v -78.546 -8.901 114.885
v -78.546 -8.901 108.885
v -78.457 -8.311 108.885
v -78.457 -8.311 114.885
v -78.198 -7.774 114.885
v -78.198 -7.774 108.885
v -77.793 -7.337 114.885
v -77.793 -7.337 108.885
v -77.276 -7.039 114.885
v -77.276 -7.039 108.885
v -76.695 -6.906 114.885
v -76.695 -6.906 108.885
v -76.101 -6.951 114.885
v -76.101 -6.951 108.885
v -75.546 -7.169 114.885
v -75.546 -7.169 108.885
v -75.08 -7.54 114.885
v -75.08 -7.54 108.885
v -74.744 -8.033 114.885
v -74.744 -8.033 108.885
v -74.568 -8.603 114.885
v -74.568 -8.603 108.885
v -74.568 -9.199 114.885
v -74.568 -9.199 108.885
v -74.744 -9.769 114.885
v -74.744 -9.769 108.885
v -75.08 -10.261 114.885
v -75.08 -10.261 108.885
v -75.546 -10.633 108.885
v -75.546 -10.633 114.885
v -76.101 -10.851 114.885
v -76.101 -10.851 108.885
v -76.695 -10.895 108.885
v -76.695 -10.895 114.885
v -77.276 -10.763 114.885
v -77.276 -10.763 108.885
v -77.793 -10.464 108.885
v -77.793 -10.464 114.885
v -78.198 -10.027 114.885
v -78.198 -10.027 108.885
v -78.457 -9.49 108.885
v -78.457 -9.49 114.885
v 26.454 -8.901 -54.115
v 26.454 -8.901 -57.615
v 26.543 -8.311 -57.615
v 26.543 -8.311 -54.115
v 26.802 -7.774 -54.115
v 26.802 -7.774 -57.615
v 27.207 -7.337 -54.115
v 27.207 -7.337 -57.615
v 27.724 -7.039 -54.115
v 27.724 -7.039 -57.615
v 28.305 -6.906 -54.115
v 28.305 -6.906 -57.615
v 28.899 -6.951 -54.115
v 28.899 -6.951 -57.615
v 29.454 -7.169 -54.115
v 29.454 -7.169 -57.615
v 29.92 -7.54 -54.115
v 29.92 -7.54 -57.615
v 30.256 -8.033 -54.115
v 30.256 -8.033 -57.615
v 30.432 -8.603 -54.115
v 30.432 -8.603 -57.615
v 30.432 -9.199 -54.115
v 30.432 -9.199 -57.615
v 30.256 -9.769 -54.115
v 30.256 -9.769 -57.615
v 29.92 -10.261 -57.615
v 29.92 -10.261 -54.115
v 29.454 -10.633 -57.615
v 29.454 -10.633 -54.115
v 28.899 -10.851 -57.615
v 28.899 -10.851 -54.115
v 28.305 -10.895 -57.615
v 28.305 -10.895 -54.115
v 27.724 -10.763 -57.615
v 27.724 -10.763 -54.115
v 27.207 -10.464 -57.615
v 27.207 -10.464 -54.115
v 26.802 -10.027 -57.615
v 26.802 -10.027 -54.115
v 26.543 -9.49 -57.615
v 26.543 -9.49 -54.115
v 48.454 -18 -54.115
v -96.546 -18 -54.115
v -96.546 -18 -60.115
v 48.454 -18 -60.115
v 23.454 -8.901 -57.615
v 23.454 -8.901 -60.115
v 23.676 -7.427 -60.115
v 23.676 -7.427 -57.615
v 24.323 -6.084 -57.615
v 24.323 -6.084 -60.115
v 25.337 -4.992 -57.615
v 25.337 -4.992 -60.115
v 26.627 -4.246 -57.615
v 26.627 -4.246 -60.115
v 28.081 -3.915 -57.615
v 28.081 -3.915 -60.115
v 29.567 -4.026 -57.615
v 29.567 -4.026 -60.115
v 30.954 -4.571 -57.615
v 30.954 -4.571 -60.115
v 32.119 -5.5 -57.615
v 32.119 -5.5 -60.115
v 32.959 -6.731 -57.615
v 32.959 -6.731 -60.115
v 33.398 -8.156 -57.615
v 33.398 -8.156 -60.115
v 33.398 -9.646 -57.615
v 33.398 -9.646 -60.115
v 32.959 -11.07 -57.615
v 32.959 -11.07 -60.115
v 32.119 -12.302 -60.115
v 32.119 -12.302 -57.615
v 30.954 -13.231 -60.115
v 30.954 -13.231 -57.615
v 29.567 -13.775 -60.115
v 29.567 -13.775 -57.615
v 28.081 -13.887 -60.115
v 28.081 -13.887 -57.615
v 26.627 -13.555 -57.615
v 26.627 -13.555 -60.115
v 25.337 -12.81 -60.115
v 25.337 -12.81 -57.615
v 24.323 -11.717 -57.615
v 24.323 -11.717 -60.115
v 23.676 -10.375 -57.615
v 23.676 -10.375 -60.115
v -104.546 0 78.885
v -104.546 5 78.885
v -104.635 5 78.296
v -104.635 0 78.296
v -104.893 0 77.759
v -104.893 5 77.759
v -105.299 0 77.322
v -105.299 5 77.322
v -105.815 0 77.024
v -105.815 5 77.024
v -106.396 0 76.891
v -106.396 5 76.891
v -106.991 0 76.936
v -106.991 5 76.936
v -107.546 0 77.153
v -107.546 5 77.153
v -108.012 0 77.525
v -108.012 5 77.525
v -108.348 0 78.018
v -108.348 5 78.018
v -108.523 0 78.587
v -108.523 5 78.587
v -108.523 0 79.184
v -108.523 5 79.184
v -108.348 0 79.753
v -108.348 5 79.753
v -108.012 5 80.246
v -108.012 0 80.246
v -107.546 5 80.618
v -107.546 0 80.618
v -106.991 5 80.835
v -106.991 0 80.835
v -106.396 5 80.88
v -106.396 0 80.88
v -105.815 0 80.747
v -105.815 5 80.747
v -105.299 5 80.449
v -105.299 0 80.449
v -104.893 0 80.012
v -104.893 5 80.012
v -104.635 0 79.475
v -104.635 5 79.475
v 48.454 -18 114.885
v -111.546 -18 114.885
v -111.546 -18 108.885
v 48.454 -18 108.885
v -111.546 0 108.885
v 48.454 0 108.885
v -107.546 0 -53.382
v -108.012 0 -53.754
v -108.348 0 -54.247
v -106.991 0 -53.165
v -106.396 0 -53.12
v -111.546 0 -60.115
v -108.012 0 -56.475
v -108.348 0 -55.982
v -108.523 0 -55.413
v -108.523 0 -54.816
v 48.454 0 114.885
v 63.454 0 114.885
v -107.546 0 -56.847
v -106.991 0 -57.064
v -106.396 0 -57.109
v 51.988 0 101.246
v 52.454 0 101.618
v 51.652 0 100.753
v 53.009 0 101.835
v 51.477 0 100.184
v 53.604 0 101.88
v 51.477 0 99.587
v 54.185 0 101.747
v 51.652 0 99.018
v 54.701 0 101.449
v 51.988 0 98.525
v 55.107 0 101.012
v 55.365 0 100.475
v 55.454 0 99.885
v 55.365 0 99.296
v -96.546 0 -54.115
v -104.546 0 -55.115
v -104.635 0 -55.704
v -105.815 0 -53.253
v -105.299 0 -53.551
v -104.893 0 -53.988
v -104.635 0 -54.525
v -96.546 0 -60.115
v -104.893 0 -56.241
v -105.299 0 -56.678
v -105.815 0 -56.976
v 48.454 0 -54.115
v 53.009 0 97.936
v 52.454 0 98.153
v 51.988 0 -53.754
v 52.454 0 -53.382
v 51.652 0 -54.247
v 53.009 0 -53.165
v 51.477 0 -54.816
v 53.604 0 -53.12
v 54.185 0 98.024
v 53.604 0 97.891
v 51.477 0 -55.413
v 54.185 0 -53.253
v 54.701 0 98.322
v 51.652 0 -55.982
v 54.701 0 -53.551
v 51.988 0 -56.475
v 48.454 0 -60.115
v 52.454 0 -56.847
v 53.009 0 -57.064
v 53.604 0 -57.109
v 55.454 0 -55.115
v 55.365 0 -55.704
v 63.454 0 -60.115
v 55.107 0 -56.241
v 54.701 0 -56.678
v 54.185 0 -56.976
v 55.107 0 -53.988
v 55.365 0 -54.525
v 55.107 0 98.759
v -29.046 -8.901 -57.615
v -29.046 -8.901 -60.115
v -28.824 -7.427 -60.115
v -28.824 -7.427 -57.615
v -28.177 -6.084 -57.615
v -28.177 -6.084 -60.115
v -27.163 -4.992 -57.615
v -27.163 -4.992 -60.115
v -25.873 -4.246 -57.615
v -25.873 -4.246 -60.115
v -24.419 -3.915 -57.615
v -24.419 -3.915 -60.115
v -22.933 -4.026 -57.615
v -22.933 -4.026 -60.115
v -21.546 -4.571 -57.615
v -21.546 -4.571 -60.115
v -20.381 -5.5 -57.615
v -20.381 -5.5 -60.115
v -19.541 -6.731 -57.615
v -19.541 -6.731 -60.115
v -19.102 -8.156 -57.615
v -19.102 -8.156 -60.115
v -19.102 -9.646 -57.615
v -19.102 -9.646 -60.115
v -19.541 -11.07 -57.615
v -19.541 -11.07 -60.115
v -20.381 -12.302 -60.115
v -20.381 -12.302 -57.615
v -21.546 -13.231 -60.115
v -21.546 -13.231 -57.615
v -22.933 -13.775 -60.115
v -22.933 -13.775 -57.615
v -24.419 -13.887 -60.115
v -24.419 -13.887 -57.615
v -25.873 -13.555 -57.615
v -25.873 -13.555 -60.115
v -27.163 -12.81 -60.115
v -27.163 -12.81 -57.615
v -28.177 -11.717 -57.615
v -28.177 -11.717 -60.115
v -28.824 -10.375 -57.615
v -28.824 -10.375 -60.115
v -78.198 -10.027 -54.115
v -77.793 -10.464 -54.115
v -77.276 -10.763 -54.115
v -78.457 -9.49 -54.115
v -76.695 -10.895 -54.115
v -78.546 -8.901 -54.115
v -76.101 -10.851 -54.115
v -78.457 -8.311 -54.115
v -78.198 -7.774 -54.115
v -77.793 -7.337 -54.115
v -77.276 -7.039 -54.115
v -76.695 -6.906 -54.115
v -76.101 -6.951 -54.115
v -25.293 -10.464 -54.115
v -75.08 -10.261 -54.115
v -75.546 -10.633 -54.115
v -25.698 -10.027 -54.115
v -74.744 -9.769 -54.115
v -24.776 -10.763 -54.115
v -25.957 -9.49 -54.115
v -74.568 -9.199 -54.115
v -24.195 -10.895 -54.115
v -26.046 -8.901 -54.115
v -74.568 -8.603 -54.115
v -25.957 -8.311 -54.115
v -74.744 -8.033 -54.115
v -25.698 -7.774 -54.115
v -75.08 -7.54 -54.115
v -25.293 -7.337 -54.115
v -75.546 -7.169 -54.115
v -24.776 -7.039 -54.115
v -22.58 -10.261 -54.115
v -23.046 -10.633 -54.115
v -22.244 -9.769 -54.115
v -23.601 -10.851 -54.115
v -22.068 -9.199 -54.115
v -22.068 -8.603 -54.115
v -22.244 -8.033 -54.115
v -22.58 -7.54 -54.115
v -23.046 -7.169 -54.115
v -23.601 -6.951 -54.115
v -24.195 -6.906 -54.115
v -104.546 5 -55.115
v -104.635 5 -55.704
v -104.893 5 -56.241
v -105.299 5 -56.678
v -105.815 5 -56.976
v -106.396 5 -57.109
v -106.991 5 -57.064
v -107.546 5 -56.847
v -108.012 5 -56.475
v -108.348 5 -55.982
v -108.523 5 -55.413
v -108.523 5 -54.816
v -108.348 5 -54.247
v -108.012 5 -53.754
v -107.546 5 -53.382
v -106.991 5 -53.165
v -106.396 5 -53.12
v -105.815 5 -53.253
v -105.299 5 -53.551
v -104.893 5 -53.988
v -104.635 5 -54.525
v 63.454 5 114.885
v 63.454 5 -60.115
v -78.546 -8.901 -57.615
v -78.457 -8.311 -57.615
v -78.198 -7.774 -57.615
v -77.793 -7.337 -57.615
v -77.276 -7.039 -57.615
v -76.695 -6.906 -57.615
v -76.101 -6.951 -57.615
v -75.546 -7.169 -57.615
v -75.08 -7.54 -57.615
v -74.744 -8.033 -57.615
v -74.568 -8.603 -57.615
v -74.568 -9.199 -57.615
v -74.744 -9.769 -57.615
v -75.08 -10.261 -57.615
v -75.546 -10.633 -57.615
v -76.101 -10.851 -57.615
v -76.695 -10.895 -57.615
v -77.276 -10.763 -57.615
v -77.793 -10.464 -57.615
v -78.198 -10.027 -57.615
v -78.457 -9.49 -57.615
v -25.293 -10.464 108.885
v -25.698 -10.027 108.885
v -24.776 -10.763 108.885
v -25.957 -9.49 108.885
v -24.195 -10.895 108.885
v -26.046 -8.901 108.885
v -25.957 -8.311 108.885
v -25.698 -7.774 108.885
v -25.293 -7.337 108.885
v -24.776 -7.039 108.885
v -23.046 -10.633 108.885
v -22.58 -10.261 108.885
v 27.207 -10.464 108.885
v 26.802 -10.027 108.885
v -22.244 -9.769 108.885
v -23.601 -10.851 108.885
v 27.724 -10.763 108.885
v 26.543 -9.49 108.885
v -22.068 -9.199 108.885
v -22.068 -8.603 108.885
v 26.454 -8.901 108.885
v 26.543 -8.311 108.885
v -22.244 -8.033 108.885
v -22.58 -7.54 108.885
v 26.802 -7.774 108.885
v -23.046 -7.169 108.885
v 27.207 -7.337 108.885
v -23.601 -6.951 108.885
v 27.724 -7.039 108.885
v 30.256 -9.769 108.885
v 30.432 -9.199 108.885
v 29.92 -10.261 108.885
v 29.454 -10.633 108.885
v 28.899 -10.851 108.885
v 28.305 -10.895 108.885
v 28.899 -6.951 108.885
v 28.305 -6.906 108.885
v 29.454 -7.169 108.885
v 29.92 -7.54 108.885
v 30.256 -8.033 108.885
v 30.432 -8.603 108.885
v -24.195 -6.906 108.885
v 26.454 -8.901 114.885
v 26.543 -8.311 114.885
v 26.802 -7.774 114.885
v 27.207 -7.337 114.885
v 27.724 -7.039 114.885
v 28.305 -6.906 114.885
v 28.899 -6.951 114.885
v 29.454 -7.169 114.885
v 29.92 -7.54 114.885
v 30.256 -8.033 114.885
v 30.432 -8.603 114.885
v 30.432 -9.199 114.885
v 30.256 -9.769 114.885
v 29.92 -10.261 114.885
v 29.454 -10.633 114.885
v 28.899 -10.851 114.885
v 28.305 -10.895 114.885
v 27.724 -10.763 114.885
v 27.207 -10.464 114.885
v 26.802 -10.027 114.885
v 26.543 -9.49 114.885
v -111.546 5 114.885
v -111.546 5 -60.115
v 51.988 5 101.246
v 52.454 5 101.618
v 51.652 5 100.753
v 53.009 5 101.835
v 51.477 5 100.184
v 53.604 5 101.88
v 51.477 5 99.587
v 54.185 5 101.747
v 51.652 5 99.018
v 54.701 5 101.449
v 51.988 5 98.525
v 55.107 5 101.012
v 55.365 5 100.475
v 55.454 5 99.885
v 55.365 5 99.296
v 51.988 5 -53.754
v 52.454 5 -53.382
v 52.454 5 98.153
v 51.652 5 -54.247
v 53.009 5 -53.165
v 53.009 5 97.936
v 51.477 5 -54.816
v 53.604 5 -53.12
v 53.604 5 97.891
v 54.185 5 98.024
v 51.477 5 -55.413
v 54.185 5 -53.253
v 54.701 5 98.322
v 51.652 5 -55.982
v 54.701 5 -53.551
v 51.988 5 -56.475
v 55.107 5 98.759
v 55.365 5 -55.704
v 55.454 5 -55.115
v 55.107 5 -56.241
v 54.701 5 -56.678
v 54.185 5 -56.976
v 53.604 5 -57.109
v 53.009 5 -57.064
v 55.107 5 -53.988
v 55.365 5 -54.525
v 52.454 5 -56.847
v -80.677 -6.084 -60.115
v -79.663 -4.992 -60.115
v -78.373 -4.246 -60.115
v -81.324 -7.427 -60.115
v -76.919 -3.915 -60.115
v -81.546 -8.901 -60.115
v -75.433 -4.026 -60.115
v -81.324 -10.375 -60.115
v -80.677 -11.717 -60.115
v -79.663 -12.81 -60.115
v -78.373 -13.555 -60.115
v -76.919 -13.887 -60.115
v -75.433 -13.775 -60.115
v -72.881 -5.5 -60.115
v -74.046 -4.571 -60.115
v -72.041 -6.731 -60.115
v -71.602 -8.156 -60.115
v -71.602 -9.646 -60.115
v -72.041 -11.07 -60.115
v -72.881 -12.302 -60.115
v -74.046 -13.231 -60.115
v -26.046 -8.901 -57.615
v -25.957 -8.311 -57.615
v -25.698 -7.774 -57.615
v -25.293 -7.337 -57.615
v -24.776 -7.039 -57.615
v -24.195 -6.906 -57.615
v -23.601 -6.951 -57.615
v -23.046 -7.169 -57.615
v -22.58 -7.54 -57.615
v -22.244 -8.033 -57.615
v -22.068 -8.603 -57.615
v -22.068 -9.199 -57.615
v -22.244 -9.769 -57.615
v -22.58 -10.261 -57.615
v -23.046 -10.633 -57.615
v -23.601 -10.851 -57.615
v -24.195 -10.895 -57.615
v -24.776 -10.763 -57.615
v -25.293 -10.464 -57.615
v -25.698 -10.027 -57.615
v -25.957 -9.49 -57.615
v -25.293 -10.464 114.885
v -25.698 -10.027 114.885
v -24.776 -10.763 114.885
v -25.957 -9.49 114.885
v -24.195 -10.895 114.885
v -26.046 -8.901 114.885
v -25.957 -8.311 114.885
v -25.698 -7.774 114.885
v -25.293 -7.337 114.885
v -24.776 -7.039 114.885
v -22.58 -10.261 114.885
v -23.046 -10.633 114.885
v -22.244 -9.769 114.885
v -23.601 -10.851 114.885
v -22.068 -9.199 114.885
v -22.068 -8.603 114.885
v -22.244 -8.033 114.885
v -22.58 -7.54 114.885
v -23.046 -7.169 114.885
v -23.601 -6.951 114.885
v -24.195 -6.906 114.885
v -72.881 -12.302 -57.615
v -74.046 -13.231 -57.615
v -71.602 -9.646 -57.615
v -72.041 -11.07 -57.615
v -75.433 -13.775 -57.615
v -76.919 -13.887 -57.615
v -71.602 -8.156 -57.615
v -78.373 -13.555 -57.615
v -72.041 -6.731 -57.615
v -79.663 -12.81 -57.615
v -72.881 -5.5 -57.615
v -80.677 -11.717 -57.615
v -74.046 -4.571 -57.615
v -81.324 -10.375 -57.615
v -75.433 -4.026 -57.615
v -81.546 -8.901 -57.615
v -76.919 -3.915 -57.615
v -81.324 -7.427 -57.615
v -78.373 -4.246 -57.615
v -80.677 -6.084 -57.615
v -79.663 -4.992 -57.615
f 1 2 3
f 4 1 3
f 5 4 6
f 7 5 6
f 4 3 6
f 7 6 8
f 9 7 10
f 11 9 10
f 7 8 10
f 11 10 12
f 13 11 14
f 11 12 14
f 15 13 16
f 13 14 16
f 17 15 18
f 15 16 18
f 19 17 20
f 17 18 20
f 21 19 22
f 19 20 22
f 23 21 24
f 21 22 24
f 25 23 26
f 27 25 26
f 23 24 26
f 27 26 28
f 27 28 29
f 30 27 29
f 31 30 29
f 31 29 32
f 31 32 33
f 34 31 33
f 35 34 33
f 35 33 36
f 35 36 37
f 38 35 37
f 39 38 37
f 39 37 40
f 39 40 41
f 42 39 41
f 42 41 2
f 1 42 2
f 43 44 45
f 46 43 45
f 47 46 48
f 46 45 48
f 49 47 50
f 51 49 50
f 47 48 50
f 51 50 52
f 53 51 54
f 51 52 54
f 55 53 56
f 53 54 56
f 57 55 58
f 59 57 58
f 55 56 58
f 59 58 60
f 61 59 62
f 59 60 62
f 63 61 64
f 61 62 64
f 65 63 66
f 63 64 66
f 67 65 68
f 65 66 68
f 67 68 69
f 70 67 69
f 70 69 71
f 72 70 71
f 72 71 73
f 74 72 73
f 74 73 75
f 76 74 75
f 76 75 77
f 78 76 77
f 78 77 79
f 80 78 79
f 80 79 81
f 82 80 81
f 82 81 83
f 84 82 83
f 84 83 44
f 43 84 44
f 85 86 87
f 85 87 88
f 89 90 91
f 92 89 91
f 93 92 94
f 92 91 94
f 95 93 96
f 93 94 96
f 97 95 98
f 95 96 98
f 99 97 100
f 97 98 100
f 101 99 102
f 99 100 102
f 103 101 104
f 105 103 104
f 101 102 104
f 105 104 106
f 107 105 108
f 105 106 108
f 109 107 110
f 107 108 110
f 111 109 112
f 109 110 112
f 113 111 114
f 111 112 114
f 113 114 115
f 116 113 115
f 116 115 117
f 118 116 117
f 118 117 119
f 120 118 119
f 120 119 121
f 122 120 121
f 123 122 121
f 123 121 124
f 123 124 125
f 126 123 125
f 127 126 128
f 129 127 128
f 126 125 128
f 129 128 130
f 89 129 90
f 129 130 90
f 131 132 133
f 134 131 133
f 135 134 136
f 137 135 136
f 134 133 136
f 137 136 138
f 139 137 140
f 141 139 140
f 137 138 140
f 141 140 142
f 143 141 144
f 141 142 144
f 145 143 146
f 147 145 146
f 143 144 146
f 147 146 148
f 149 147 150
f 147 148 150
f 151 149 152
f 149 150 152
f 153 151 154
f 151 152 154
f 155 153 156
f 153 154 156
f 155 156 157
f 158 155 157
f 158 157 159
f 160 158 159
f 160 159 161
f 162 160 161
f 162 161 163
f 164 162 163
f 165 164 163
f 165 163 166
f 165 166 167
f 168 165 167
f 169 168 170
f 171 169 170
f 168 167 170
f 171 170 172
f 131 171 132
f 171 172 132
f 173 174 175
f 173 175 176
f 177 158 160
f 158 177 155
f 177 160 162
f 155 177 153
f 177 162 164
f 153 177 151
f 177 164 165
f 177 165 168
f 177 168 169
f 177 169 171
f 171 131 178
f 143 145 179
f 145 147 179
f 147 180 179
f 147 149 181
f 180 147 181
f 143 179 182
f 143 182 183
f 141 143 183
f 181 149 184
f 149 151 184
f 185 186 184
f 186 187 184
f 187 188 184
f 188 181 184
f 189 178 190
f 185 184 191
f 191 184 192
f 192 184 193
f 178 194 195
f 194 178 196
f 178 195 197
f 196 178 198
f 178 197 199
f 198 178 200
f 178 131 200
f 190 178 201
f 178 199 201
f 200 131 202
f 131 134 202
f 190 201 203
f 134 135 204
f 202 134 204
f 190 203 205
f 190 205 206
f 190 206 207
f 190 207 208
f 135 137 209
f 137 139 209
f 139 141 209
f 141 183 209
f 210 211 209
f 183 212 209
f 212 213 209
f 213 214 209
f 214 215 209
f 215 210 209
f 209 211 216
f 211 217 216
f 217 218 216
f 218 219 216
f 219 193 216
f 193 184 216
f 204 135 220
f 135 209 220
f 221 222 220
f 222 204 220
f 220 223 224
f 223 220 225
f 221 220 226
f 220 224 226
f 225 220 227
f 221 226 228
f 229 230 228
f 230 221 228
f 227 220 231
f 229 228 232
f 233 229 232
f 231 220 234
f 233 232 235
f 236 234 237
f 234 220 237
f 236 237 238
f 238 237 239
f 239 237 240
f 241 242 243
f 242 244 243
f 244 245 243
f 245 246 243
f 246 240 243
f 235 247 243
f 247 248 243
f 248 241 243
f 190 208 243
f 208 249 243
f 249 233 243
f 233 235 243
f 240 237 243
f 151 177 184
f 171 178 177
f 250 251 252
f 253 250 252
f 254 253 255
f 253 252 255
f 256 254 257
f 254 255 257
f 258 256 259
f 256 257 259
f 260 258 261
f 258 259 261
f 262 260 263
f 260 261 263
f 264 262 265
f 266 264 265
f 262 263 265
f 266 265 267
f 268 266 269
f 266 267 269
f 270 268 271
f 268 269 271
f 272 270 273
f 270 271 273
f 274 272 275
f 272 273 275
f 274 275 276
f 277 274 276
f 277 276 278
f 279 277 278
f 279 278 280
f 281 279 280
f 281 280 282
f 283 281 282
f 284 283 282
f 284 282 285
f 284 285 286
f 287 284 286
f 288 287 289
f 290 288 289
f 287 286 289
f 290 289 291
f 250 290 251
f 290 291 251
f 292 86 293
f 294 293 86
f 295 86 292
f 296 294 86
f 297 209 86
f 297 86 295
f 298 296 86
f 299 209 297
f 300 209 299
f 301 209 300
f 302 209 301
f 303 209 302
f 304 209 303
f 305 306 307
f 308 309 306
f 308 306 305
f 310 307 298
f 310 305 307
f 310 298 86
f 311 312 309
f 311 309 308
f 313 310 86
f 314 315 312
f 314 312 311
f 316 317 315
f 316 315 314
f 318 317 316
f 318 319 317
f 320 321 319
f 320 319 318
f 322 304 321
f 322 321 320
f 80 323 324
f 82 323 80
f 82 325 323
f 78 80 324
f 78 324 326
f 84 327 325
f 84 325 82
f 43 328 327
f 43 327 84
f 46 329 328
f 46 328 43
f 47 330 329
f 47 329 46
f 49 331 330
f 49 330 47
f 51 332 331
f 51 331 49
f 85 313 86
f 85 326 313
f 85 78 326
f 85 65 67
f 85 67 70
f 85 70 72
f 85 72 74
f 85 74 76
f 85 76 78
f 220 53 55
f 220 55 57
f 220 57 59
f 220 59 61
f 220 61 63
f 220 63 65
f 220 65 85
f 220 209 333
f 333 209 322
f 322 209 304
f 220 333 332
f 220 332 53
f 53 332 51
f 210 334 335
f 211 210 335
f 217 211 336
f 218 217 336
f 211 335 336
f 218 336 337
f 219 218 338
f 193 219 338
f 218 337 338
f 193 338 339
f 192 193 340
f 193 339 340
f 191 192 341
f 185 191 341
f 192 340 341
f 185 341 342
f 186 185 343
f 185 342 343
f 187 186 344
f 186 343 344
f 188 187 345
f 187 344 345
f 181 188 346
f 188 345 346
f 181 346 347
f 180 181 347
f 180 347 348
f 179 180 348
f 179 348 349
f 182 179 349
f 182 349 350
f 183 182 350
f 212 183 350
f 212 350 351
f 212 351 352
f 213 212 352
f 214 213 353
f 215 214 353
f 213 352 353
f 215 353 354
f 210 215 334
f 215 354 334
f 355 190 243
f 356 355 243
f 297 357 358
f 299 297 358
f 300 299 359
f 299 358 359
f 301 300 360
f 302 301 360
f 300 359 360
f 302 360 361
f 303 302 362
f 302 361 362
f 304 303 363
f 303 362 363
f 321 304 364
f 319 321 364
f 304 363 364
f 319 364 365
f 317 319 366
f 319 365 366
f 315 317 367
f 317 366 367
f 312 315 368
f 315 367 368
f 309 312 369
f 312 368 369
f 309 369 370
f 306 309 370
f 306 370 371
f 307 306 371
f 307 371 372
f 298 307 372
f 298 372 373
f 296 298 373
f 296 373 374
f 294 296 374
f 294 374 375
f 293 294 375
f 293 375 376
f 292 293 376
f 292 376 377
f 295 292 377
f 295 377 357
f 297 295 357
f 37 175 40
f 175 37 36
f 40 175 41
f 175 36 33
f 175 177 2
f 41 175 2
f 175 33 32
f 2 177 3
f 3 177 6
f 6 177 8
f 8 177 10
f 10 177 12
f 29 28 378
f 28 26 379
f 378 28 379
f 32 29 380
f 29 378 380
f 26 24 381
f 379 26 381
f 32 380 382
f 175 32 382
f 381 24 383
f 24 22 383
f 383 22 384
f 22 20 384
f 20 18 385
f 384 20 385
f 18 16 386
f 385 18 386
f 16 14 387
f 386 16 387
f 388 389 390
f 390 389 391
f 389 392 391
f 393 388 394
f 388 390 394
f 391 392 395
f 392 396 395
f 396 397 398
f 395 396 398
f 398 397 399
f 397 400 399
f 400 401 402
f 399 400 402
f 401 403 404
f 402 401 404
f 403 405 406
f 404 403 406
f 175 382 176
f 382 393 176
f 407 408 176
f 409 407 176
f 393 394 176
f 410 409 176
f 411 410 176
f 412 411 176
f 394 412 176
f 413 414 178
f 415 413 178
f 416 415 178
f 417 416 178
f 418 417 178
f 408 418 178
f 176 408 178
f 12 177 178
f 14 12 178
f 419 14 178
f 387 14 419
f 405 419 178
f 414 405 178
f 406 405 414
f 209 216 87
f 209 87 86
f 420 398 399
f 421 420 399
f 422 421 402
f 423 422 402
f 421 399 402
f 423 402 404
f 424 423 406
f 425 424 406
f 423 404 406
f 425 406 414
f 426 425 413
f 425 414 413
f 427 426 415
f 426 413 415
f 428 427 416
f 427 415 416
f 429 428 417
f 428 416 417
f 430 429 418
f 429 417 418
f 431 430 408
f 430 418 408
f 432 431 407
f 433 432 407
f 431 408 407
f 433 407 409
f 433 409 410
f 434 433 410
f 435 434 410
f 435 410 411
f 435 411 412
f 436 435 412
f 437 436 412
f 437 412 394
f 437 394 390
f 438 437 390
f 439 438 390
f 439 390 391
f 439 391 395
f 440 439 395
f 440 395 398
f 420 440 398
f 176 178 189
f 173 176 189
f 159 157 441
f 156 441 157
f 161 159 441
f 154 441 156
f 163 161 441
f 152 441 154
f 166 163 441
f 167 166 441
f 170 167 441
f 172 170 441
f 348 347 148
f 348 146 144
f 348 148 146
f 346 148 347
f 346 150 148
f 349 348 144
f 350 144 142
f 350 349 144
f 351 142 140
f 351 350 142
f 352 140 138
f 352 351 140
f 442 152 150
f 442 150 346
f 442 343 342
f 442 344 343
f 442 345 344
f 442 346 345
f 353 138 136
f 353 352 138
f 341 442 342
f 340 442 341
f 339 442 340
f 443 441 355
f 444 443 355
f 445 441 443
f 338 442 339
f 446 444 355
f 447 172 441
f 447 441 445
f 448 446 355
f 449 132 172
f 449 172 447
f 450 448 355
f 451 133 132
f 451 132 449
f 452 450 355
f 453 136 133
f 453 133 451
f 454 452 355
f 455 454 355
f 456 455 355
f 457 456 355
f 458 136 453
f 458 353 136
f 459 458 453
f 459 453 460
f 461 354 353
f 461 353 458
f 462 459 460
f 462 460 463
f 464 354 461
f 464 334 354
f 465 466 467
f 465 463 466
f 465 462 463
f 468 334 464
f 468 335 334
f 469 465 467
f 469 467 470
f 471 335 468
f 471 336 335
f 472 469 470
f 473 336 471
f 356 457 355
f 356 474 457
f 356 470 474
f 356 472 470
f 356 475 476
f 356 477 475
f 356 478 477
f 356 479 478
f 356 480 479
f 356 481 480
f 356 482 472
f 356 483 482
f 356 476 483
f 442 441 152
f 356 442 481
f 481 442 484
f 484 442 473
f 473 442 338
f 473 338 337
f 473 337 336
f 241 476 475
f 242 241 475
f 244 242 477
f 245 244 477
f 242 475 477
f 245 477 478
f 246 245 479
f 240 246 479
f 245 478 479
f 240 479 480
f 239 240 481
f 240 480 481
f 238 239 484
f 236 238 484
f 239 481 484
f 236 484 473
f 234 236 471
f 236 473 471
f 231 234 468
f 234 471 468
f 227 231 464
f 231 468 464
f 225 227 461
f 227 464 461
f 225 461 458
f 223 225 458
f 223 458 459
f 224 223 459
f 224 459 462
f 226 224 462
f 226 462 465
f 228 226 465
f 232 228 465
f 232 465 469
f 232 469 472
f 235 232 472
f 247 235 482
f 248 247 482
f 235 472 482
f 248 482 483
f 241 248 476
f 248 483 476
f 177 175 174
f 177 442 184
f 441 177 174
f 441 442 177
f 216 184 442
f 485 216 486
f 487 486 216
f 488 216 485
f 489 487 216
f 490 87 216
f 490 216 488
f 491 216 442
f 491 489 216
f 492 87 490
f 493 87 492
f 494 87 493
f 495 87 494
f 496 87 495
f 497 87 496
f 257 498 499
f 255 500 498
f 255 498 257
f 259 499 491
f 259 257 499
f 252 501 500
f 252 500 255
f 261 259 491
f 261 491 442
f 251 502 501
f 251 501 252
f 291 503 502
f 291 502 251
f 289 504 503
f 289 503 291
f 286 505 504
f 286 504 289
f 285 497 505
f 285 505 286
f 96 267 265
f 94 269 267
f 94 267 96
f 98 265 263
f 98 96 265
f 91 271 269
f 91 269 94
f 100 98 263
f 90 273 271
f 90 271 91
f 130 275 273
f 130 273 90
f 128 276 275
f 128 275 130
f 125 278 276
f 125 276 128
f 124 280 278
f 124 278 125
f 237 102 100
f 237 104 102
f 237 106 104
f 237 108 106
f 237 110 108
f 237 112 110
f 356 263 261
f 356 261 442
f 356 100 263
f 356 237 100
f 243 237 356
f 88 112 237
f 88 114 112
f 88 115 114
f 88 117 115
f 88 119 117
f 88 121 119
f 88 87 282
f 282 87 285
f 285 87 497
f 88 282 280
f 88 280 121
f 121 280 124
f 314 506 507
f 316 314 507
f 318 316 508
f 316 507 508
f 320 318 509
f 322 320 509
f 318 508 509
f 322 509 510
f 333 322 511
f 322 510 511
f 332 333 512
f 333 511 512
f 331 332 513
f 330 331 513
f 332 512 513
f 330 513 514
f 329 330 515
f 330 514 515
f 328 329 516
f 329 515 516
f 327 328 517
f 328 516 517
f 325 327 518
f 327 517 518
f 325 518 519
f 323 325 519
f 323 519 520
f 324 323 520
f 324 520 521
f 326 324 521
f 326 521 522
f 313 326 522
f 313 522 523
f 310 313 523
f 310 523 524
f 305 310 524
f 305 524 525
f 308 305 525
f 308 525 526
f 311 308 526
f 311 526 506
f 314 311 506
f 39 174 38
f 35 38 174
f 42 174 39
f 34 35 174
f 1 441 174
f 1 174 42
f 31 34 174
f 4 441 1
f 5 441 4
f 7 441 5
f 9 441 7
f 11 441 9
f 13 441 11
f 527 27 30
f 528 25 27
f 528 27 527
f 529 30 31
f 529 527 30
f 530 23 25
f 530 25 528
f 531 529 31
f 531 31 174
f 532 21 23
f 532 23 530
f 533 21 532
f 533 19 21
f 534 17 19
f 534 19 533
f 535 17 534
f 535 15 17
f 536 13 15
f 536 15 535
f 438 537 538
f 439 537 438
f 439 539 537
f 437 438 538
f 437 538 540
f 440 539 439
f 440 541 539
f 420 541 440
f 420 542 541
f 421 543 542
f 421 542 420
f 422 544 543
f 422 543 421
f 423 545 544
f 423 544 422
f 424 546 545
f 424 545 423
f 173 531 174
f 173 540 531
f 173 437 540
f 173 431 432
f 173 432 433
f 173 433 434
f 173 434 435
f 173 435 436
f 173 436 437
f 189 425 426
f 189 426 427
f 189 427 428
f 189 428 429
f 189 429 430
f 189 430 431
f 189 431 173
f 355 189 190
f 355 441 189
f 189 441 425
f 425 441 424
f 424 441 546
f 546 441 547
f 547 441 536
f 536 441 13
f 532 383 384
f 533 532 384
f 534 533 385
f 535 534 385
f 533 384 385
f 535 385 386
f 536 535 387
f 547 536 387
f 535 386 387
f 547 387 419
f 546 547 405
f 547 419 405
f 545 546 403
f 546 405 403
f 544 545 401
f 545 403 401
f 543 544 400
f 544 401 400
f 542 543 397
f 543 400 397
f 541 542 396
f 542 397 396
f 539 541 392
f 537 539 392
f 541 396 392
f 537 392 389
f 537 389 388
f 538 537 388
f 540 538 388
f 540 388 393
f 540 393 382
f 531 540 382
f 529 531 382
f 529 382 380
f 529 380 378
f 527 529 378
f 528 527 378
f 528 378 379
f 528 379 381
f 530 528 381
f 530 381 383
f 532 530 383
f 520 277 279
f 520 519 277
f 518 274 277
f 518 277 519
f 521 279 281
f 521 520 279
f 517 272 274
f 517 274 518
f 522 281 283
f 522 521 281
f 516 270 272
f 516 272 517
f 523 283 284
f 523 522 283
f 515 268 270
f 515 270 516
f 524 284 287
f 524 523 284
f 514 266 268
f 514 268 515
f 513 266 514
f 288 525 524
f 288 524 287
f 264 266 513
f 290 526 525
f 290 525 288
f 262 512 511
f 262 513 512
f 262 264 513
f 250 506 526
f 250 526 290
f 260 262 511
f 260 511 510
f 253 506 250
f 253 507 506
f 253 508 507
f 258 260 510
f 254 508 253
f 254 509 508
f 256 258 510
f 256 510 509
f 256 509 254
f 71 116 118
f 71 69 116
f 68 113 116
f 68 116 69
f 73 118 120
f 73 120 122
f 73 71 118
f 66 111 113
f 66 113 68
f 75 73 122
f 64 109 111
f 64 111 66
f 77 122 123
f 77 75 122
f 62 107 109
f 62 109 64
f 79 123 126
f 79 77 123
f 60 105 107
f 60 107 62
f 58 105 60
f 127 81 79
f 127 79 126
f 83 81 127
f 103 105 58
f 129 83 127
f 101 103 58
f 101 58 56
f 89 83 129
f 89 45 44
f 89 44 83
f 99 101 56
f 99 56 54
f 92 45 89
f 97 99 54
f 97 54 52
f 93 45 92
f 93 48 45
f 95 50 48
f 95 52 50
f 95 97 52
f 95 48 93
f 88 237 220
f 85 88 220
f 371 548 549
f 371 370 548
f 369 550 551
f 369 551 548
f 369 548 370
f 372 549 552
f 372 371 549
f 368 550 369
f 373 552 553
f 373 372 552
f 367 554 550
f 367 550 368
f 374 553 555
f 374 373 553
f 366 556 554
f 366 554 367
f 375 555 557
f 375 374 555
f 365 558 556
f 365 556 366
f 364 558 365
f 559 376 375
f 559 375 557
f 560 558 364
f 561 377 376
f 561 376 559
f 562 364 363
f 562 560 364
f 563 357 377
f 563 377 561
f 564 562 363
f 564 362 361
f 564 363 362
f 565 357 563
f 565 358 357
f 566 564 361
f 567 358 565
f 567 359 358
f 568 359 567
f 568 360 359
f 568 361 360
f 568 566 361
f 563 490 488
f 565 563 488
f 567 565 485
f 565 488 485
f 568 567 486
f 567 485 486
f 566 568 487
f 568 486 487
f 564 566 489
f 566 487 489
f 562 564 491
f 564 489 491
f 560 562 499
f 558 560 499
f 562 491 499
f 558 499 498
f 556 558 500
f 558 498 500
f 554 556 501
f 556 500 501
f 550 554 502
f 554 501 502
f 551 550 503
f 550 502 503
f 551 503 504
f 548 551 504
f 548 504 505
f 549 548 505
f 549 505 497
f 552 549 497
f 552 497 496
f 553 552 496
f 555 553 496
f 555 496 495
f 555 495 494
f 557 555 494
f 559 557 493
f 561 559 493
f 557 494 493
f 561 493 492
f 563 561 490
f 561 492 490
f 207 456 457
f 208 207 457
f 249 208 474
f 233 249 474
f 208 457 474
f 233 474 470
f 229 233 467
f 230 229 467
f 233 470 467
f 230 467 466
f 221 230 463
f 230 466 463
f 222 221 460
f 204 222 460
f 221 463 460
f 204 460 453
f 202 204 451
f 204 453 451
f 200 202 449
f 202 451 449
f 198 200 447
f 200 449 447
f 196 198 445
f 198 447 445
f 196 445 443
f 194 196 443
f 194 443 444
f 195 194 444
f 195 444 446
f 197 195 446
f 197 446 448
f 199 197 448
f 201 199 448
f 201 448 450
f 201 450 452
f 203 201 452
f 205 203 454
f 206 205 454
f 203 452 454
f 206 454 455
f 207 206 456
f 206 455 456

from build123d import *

# Parameters (mm, degrees)
SKETCH1_W               = 175
SKETCH1_H               = 175
BOSS_EXTRUDE1_DEPTH     = 5
SKETCH2_R               = 2
CUT_EXTRUDE1_DEPTH      = 5
SKETCH3_W               = 160
SKETCH3_H               = 6
SKETCH3_W_2             = 145
BOSS_EXTRUDE3_DEPTH     = 18
SKETCH4_R               = 2
CUT_EXTRUDE2_DEPTH      = 1
CUT_EXTRUDE2_DEPTH_BACK = 176
SKETCH5_R               = 5
CUT_EXTRUDE3_DEPTH      = 2.5


with BuildPart() as part:
    # Sketch1 → Boss-Extrude1 (new body)
    with BuildSketch(Plane(origin=(0, 0, 0), x_dir=(1, 0, 0), z_dir=(0, 1, 0))):
        with Locations((-24.045801527, -27.385496183)):
            Rectangle(SKETCH1_W, SKETCH1_H)
    extrude(amount=BOSS_EXTRUDE1_DEPTH)

    # Sketch2 → Cut-Extrude1 (cut)
    with BuildSketch(Plane(origin=(0, 5, 0), x_dir=(1, 0, 0), z_dir=(0, 1, 0))):
        with Locations((-106.545801527, 55.114503817)):
            Circle(SKETCH2_R)
        with Locations((53.454198473, 55.114503817)):
            Circle(SKETCH2_R)
        with Locations((53.454198473, -99.885496183)):
            Circle(SKETCH2_R)
        with Locations((-106.545801527, -78.885496183)):
            Circle(SKETCH2_R)
    extrude(amount=-CUT_EXTRUDE1_DEPTH, mode=Mode.SUBTRACT)

    # Sketch3 → Boss-Extrude3 (add)
    with BuildSketch(Plane.XZ):
        with Locations((-31.545801527, 111.885496183)):
            Rectangle(SKETCH3_W, SKETCH3_H)
        with Locations((-24.045801527, -57.114503817)):
            Rectangle(SKETCH3_W_2, SKETCH3_H)
    extrude(amount=BOSS_EXTRUDE3_DEPTH)

    # Sketch4 → Cut-Extrude2 (cut, two sides)
    with BuildSketch(Plane(origin=(0, 0, -60.114503817), x_dir=(-1, 0, 0), z_dir=(0, 0, -1))) as cut_extrude2_sk:
        with Locations((-28.454198473, -8.900832872)):
            Circle(SKETCH4_R)
        with Locations((24.045801527, -8.900832872)):
            Circle(SKETCH4_R)
        with Locations((76.545801527, -8.900832872)):
            Circle(SKETCH4_R)
    extrude(amount=CUT_EXTRUDE2_DEPTH, mode=Mode.SUBTRACT)
    extrude(cut_extrude2_sk.sketch, amount=-CUT_EXTRUDE2_DEPTH_BACK, mode=Mode.SUBTRACT)

    # Sketch5 → Cut-Extrude3 (cut)
    with BuildSketch(Plane(origin=(0, 0, -60.114503817), x_dir=(-1, 0, 0), z_dir=(0, 0, -1))):
        with Locations((-28.454198473, -8.900832872)):
            Circle(SKETCH5_R)
        with Locations((24.045801527, -8.900832872)):
            Circle(SKETCH5_R)
        with Locations((76.545801527, -8.900832872)):
            Circle(SKETCH5_R)
    extrude(amount=-CUT_EXTRUDE3_DEPTH, mode=Mode.SUBTRACT)


solid = part.part
